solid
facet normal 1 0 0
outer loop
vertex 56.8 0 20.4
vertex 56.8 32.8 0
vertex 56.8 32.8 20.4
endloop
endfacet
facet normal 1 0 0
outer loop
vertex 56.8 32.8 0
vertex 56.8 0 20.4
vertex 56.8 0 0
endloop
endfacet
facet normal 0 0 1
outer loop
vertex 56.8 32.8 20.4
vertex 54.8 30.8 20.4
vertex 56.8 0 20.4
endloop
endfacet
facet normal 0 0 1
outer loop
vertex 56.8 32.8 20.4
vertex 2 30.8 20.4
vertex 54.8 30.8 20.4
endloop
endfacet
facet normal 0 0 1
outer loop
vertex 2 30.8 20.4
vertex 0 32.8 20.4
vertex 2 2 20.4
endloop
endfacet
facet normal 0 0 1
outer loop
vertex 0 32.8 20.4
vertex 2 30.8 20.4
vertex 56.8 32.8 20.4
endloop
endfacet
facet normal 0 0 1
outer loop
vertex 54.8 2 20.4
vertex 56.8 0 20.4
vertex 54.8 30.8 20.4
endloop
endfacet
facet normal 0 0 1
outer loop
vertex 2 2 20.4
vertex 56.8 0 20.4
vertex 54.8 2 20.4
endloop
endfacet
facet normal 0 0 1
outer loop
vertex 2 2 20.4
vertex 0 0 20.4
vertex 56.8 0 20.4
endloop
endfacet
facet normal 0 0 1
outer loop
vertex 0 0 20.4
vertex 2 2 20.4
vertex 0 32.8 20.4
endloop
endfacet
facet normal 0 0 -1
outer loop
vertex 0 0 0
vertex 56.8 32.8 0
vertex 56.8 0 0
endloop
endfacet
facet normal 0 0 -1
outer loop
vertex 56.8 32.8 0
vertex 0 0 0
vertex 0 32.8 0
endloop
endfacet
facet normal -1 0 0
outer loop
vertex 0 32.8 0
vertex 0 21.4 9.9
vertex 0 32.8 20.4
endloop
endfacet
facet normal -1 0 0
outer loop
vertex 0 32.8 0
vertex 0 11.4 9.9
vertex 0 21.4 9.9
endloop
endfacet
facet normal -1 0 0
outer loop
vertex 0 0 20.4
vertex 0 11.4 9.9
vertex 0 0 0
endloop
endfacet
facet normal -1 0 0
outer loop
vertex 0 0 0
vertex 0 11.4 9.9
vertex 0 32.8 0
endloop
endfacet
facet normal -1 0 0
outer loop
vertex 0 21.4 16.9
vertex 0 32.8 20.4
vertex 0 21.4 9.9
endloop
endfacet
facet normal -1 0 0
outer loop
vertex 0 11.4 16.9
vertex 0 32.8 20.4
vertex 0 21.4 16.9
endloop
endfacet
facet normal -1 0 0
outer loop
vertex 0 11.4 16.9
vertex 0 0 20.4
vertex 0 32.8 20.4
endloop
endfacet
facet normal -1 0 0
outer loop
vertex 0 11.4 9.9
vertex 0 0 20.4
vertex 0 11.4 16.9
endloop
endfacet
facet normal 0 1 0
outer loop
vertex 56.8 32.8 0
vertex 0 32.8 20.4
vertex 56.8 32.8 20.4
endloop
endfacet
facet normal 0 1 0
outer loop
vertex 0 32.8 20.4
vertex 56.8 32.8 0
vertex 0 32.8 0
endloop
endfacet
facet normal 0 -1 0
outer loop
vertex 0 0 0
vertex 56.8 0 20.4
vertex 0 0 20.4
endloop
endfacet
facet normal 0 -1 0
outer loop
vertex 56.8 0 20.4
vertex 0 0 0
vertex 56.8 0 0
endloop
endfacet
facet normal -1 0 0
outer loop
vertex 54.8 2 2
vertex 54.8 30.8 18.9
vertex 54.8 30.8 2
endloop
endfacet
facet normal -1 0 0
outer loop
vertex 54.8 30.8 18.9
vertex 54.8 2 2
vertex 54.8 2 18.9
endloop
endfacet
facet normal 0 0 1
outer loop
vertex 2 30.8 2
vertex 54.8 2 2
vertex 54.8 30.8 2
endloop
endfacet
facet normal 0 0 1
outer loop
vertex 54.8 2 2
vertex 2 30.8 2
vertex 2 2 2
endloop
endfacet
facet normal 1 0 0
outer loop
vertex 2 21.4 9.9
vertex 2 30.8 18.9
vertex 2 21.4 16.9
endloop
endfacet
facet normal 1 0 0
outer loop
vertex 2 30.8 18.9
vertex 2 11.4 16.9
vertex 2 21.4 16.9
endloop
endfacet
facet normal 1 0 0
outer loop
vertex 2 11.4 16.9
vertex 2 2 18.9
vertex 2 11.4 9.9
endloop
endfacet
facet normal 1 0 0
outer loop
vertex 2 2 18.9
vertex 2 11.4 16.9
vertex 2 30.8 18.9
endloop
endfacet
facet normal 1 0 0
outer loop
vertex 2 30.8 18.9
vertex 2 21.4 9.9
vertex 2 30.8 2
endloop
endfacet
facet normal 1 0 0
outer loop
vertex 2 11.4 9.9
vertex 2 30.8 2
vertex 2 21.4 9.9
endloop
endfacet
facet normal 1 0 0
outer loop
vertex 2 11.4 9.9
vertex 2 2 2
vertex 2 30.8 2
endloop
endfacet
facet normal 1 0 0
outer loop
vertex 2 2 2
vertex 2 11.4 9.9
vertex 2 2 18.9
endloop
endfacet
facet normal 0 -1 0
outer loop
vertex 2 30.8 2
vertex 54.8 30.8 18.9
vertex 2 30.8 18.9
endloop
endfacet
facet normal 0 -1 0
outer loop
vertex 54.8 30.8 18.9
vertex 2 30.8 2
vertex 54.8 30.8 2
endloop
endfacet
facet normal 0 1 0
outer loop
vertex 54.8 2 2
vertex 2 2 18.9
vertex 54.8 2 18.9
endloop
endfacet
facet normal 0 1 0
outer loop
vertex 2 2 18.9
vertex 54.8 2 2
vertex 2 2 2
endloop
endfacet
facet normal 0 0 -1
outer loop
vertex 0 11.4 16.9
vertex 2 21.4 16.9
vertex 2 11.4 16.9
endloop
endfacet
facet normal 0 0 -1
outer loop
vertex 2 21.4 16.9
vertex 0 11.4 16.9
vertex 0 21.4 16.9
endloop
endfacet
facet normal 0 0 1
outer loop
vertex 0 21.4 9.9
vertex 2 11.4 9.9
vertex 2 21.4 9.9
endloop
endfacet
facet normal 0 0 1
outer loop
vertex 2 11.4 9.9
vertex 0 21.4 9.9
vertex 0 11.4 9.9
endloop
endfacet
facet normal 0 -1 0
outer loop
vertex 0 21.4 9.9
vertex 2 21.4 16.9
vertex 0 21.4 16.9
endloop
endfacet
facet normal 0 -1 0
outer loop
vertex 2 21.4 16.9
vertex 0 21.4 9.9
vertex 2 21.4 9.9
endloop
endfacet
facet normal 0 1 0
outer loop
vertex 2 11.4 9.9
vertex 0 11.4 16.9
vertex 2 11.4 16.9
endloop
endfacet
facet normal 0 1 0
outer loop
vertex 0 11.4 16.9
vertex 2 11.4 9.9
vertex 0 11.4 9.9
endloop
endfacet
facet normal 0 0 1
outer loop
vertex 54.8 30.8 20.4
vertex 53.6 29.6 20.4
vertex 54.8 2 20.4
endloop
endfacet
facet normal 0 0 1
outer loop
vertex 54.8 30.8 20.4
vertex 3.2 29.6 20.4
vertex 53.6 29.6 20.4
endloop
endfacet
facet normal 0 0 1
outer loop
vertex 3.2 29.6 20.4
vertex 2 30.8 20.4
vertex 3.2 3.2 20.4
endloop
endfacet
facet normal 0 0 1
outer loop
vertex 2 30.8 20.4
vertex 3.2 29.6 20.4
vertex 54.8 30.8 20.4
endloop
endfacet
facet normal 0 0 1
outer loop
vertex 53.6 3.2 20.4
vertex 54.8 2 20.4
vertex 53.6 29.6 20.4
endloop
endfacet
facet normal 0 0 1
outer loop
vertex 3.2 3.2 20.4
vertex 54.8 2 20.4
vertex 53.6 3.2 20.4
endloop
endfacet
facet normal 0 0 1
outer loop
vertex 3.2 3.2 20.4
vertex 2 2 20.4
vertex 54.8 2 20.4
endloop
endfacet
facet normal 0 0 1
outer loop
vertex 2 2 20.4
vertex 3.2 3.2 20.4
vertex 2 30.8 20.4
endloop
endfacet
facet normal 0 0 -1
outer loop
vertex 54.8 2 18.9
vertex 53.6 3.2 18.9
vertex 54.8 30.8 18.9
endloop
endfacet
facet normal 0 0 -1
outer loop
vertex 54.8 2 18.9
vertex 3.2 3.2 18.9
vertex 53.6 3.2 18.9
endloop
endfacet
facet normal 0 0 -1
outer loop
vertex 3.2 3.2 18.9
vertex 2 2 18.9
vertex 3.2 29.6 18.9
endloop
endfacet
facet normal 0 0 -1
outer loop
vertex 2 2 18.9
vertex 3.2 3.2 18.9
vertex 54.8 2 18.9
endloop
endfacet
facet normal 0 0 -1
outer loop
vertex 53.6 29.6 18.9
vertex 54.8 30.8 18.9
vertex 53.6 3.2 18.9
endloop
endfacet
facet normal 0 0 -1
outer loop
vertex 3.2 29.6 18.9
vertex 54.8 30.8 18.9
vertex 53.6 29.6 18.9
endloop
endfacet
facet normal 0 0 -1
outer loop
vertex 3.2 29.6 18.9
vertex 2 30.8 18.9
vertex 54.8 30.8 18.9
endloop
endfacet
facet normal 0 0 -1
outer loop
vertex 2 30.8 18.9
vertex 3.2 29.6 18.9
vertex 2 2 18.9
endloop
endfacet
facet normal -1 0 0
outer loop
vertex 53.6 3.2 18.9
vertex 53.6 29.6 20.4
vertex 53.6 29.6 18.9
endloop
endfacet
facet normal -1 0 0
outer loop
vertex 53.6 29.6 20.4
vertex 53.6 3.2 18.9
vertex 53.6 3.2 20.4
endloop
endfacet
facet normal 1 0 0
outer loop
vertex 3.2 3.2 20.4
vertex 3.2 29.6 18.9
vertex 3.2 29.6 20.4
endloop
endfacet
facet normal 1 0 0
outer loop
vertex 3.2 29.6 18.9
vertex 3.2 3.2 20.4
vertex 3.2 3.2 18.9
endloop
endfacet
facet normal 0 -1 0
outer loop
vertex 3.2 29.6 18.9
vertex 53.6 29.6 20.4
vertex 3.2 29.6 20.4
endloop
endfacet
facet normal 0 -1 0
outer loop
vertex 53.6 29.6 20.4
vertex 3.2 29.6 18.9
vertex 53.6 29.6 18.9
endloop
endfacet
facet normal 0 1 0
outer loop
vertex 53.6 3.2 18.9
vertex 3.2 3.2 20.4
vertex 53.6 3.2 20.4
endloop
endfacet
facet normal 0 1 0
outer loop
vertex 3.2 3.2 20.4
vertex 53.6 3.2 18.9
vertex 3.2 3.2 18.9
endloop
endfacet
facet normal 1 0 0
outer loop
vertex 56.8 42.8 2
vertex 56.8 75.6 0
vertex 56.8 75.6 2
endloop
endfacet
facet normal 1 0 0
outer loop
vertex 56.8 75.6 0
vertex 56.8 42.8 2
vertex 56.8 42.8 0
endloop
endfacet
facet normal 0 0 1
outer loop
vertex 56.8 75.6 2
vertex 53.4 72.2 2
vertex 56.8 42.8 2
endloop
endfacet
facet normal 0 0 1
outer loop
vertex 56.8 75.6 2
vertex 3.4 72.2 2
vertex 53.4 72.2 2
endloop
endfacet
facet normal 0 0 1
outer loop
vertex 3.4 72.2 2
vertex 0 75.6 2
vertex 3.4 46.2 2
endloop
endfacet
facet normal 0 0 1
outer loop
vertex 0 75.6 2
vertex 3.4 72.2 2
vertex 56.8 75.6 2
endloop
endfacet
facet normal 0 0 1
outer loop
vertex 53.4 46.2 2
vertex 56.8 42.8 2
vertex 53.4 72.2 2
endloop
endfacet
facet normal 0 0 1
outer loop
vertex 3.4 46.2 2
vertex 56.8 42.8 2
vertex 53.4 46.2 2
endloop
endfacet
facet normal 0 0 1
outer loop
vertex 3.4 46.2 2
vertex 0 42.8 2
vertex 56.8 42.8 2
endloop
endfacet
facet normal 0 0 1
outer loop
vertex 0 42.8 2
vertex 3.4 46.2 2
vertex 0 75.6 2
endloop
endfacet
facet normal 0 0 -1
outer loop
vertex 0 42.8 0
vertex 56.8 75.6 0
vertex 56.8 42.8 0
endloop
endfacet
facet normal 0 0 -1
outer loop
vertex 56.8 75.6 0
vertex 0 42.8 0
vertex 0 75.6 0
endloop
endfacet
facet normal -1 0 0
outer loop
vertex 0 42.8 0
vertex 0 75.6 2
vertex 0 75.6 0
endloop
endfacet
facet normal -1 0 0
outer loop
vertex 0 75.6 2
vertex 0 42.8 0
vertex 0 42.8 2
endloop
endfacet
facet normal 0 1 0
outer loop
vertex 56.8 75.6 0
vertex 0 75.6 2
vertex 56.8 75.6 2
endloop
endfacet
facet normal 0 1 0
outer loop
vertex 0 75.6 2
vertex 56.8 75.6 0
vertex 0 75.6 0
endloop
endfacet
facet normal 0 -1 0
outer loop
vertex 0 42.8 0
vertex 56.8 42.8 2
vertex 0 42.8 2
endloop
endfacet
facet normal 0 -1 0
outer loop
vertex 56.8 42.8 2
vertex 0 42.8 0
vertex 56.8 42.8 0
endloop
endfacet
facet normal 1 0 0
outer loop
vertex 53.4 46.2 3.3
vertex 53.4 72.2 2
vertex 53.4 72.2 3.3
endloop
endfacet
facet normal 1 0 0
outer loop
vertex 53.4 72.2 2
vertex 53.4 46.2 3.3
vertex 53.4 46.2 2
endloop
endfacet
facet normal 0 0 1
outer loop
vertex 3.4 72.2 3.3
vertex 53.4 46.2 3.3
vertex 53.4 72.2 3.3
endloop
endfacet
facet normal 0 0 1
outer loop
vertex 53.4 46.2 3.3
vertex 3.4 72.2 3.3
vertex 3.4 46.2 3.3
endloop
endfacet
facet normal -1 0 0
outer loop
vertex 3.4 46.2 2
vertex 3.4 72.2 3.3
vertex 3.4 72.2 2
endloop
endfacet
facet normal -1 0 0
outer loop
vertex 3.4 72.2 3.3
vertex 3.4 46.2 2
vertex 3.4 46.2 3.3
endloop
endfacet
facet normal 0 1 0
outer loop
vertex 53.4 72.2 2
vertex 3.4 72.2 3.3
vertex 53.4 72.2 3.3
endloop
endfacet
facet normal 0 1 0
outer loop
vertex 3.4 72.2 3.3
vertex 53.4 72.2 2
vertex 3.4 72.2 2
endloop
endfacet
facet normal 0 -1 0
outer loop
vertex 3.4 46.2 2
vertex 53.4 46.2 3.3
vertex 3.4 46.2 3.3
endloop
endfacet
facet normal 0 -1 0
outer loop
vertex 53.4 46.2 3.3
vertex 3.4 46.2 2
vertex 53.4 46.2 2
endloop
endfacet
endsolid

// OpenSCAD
// HiveRelay case — Adafruit HUZZAH32 Feather
// Board: 52mm x 28mm x 18mm (L x W x H)
// USB slot: 10mm x 7mm on short side

// --- Parameters ---
board_l = 52;    // sides A+C (long)
board_w = 28;    // sides B+D (short)
board_h = 18;    // thickness

wall    = 2;     // wall thickness
tol     = 0.4;   // clearance per side
lip     = 1.5;   // lid press-fit lip height
lip_t   = 1.2;   // lip thickness

usb_w   = 10;    // USB slot width
usb_h   = 7;     // USB slot height

// --- Derived ---
inner_l = board_l + tol * 2;
inner_w = board_w + tol * 2;
inner_h = board_h + tol;

outer_l = inner_l + wall * 2;
outer_w = inner_w + wall * 2;
outer_h = inner_h + wall;        // base wall only (no top wall — lid covers)

lid_h   = wall + lip;

// --- Base ---
module base() {
    difference() {
        // Outer shell
        cube([outer_l, outer_w, outer_h]);

        // Inner cavity
        translate([wall, wall, wall])
            cube([inner_l, inner_w, inner_h + 1]);  // +1 open top

        // USB slot on short side (x=0), near top but below lip
        translate([-0.1, outer_w/2 - usb_w/2, outer_h - usb_h - lip - wall])
            cube([wall + 0.2, usb_w, usb_h]);
    }

    // Lip ledge inside walls for lid to rest on
    // (inset ridge around top inner perimeter)
    translate([wall, wall, outer_h - lip])
    difference() {
        cube([inner_l, inner_w, lip]);
        translate([lip_t, lip_t, -0.1])
            cube([inner_l - lip_t*2, inner_w - lip_t*2, lip + 0.2]);
    }
}

// --- Lid ---
module lid() {
    // Flat top
    cube([outer_l, outer_w, wall]);

    // Press-fit tongue (fits inside the lip ledge)
    translate([wall + lip_t + tol/2, wall + lip_t + tol/2, wall])
        cube([inner_l - lip_t*2 - tol, inner_w - lip_t*2 - tol, lip - 0.2]);
}

// --- Layout for printing ---
base();

translate([0, outer_w + 10, 0])
    lid();
